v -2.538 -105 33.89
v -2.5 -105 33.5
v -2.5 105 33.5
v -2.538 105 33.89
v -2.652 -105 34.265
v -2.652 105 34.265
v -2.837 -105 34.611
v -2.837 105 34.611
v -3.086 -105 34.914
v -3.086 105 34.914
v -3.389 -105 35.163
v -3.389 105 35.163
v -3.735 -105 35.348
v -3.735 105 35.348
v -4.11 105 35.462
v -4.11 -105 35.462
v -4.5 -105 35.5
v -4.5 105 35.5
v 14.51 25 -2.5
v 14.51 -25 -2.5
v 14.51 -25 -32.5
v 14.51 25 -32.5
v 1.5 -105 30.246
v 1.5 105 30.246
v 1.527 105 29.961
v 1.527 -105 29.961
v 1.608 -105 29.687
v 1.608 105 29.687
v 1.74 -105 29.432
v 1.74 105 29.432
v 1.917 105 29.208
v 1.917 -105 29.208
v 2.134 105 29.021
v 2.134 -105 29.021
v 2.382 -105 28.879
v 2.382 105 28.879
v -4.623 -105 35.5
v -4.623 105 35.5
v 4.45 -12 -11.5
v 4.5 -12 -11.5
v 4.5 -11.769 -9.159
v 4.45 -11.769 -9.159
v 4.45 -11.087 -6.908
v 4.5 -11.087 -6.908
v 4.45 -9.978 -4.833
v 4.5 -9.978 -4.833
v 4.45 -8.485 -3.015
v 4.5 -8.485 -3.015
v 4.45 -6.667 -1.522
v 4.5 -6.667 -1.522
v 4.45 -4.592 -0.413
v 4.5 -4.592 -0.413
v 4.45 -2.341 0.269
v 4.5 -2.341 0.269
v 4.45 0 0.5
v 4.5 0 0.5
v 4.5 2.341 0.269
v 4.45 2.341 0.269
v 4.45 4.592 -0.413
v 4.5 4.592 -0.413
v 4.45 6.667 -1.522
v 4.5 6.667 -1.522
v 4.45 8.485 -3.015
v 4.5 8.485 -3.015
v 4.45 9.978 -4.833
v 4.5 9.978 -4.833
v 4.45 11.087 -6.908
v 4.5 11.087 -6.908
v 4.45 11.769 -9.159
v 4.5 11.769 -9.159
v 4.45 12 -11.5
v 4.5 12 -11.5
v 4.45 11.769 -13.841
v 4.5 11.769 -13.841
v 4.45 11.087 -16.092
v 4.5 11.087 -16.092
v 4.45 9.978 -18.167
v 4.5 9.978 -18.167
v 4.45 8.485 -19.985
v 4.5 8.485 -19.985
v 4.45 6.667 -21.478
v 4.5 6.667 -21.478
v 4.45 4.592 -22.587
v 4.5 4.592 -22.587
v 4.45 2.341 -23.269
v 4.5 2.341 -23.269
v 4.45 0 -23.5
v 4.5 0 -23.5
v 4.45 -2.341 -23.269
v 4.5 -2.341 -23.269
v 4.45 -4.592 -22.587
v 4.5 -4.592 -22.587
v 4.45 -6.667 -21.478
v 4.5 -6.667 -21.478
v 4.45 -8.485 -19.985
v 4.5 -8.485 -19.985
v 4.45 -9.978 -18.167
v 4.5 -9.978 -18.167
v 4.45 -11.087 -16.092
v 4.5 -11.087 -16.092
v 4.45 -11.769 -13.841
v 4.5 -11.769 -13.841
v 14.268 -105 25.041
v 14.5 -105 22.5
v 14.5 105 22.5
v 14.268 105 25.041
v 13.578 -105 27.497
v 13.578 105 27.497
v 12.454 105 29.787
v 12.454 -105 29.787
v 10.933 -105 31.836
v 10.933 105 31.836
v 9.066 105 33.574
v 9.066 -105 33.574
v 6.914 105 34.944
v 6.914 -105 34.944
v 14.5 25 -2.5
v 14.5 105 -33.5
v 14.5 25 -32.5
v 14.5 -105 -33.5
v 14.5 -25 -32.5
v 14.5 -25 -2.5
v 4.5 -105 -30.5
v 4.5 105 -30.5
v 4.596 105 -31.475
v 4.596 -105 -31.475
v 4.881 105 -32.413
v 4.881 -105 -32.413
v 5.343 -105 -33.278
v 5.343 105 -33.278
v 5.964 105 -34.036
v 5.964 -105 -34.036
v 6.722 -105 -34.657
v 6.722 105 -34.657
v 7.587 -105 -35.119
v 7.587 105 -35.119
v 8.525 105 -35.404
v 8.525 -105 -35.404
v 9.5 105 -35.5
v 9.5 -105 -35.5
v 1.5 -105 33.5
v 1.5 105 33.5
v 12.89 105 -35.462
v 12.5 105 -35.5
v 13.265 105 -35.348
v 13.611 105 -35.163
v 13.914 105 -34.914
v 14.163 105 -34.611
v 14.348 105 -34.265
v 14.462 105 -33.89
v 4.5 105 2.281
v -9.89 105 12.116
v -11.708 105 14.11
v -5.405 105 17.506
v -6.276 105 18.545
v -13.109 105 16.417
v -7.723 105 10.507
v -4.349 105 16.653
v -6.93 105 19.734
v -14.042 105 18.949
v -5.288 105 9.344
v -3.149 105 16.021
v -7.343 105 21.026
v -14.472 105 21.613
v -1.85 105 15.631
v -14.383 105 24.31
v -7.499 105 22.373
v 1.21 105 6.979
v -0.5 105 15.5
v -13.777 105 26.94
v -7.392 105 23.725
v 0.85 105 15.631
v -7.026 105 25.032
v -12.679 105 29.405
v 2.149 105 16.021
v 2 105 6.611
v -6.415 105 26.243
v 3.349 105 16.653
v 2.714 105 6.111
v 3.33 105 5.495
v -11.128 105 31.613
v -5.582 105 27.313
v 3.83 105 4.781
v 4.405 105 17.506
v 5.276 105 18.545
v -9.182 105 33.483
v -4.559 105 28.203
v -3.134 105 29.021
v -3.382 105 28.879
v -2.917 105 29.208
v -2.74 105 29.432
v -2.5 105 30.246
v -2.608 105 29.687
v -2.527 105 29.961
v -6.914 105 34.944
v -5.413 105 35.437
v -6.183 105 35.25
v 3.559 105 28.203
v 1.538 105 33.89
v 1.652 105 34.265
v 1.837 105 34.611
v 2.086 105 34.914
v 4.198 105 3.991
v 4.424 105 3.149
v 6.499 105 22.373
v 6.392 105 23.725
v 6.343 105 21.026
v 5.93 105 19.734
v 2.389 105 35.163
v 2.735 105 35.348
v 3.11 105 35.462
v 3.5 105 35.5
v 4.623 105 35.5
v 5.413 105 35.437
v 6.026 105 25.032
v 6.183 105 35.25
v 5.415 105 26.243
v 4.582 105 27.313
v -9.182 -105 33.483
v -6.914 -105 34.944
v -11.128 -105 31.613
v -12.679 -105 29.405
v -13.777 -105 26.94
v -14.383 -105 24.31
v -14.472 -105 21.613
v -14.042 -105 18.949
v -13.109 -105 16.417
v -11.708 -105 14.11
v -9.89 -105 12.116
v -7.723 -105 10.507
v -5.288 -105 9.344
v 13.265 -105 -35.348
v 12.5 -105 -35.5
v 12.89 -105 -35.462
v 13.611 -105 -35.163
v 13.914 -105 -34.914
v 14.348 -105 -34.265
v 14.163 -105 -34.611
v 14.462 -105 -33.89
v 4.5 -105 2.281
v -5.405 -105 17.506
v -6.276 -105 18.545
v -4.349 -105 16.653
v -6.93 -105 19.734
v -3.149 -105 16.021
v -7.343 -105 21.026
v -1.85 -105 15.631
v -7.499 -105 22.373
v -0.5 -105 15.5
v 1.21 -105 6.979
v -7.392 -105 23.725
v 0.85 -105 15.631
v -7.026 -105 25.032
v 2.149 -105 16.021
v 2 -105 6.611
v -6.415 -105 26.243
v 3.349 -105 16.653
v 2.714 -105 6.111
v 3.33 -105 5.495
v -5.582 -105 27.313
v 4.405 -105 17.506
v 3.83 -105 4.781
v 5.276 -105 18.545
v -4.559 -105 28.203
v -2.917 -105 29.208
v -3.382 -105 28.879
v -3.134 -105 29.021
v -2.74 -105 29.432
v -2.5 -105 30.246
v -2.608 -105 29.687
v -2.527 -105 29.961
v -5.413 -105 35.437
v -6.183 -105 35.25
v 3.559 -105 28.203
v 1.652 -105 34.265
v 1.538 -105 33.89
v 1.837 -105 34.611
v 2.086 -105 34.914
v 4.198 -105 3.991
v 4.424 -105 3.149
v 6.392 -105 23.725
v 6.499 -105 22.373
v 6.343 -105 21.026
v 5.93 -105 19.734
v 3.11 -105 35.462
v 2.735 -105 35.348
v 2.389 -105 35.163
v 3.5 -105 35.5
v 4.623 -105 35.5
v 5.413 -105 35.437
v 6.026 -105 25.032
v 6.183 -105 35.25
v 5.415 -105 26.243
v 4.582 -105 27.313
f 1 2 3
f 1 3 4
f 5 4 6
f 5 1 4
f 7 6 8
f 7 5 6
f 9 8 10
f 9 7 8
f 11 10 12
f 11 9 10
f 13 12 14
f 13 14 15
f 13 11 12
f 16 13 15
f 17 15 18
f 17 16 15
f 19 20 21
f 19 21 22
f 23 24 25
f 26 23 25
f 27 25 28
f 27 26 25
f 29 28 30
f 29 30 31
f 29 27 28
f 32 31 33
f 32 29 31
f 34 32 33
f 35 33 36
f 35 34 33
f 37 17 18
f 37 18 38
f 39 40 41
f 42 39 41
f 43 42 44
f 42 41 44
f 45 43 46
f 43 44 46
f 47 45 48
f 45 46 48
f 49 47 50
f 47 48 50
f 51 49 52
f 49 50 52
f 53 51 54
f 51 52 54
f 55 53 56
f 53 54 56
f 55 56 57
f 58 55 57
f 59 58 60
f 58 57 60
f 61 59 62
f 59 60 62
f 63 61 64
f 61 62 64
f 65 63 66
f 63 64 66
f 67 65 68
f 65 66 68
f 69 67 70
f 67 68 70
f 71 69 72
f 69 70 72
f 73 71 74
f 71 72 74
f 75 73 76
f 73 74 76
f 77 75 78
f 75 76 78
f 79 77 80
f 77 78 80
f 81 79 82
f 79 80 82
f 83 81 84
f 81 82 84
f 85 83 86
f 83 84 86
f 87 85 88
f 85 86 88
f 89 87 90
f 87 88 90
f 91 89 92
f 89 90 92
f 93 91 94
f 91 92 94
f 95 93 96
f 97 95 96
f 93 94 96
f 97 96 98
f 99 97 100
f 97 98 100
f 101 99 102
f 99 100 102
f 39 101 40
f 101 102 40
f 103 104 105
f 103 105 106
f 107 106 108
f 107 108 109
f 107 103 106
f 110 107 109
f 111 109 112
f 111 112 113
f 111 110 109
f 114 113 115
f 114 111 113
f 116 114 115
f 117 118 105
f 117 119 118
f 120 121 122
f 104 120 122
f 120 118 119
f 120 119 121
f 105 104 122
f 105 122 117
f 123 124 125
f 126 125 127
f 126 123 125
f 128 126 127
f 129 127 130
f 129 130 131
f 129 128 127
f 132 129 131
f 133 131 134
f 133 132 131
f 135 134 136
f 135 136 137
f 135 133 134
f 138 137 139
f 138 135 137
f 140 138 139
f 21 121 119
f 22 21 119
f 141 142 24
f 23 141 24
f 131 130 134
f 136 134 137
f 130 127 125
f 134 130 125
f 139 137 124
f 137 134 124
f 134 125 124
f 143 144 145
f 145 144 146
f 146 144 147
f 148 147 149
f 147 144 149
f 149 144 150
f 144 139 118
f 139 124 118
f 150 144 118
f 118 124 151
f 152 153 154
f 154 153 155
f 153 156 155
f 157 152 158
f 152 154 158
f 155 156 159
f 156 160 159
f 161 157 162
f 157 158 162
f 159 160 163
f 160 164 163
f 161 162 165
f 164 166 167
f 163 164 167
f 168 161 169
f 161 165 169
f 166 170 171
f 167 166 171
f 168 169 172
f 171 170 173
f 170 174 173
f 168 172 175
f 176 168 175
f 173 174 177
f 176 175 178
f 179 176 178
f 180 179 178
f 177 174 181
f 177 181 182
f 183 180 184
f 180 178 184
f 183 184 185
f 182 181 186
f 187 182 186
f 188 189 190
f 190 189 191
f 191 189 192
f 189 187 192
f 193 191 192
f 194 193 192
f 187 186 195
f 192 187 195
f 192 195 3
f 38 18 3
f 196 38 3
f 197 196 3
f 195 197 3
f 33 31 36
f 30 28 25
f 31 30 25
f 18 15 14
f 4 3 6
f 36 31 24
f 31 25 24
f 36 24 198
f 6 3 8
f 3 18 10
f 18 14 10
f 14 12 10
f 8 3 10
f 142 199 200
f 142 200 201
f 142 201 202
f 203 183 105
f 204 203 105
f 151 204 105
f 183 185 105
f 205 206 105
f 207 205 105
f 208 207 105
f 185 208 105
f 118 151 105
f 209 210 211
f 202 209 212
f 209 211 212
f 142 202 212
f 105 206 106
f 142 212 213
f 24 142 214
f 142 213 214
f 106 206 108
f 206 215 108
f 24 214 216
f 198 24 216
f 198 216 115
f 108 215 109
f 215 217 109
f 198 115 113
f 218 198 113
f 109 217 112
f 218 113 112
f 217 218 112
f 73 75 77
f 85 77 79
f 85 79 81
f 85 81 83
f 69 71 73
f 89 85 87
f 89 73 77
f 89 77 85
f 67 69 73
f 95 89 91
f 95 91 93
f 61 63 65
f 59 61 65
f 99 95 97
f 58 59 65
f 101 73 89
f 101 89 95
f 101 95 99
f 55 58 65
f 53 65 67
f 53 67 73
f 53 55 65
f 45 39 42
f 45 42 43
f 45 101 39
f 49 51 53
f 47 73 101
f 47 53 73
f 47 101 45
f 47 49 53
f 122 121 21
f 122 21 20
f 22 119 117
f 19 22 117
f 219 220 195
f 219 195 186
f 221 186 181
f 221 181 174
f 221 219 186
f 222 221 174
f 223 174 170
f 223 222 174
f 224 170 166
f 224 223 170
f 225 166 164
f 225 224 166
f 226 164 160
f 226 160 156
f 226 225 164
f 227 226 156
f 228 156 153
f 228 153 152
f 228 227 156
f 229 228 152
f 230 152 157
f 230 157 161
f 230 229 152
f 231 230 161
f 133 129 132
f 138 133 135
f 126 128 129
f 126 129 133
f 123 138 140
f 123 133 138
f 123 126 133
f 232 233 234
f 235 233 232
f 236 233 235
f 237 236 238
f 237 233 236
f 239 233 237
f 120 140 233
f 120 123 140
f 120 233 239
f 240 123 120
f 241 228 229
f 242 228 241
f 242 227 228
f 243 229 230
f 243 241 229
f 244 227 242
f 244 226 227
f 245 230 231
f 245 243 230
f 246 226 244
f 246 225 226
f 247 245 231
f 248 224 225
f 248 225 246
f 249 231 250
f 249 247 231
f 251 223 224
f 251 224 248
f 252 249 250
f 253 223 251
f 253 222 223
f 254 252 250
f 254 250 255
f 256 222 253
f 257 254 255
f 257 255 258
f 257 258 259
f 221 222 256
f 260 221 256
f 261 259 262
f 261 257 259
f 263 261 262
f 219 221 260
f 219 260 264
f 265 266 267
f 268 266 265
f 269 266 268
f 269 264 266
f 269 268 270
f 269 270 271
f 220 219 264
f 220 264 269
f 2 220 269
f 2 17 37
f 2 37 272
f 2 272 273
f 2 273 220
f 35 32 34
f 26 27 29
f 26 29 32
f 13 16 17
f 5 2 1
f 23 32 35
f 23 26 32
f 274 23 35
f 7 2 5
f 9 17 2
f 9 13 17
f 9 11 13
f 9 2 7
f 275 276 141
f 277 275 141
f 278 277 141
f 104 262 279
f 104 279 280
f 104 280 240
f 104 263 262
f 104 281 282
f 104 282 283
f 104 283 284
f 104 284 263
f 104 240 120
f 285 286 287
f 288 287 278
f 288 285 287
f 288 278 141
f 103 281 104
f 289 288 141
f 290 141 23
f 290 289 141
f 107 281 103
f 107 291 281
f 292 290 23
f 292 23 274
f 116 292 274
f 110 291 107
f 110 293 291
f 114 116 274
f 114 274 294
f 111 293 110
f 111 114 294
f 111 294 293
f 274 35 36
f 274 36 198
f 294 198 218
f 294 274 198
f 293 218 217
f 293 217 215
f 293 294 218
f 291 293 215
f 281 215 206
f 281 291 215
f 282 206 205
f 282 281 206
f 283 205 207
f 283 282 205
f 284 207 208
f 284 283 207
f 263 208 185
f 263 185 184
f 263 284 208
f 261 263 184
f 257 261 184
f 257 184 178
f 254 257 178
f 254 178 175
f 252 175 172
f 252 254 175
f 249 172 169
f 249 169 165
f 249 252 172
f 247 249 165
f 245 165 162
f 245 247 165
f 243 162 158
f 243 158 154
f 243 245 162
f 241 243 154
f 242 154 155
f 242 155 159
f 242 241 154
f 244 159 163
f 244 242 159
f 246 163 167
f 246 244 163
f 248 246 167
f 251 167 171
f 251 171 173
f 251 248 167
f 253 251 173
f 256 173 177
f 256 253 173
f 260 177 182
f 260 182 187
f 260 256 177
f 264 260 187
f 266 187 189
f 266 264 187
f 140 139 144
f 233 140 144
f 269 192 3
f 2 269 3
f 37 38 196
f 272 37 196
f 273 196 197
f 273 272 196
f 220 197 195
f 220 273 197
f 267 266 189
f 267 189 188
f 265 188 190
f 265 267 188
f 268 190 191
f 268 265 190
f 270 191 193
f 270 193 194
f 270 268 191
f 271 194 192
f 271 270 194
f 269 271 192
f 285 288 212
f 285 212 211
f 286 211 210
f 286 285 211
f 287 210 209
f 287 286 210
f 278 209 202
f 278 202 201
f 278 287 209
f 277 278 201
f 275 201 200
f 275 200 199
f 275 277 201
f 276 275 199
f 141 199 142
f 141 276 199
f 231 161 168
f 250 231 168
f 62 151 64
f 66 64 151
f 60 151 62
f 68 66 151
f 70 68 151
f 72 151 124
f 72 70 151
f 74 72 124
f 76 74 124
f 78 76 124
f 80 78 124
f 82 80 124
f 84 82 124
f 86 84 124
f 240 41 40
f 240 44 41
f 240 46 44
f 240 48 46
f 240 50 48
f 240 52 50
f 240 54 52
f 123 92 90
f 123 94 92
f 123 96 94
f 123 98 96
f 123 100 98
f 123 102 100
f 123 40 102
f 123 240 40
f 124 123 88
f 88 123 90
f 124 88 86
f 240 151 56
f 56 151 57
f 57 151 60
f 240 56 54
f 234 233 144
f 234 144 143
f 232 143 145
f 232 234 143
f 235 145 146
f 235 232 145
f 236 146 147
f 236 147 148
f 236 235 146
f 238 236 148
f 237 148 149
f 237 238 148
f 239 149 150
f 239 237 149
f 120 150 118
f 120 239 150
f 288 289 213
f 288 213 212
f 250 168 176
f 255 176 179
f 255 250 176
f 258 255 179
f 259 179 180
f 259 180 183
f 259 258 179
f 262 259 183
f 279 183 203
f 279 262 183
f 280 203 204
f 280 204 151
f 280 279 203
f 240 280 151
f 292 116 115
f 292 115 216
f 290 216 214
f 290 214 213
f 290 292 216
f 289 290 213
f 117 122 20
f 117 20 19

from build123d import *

# Parameters (mm, degrees)
F1_DEPTH = 105
F2_R     = 12
F3_DEPTH = 0.05
F4_W     = 50
F4_H     = 30
F5_DEPTH = 0.01


# Not quite as in the source:
# - ends of sketch curves that miss each other by under 0.0002 mm in the source are joined


with BuildPart() as f1:
    # F0 (on Front) → F1 (new body, symmetric)
    with BuildSketch(Plane.XZ):
        with BuildLine():
            Line((4.4999999997, -23.5), (4.4999999997, -30.5))
            ThreePointArc((4.4999999997, -30.5), (5.9644660938, -34.0355339059), (9.4999999997, -35.5))
            Line((9.4999999997, -35.5), (12.5, -35.5))
            ThreePointArc((12.5, -35.5), (13.9142133287, -34.9142135624), (14.4999997663, -33.5))
            Line((14.4999997663, -33.5), (14.4999997663, 22.4999994828))
            ThreePointArc((14.4999997663, 22.4999994828), (12.4539129776, 29.7872458033), (6.9137199183, 34.9444437777))
            ThreePointArc((6.9137199183, 34.9444437777), (5.8016169865, 35.3591259101), (4.6231056877, 35.4999993303))
            Line((4.6231056877, 35.4999993303), (3.4999997663, 35.4999993303))
            ThreePointArc((3.4999997663, 35.4999993303), (2.0857862039, 34.9142128927), (1.4999997663, 33.4999993303))
            Line((1.4999997663, 33.4999993303), (1.4999997663, 30.2459664828))
            ThreePointArc((1.4999997663, 30.2459664828), (1.7397477835, 29.4324771221), (2.3823530195, 28.8790310431))
            ThreePointArc((2.3823530195, 28.8790310431), (-0.5000000985, 15.4999997293), (-3.3823532363, 28.8790310342))
            ThreePointArc((-3.3823532363, 28.8790310342), (-2.7397478169, 29.4324771961), (-2.4999997997, 30.2459665567))
            Line((-2.4999997997, 30.2459665567), (-2.4999997997, 33.5))
            ThreePointArc((-2.4999997997, 33.5), (-3.0857862373, 34.9142132361), (-4.4999997997, 35.4999996738))
            Line((-4.4999997997, 35.4999996738), (-4.6231058319, 35.4999996738))
            ThreePointArc((-4.6231058319, 35.4999996738), (-5.8016171306, 35.3591262536), (-6.9137200625, 34.9444441212))
            ThreePointArc((-6.9137200625, 34.9444441212), (-14.4718653147, 21.6128794539), (-5.288282, 9.344303))
            Line((-5.288282, 9.344303), (1.210101, 6.979085))
            ThreePointArc((1.210101, 6.979085), (3.5957603078, 5.1485040574), (4.4999999997, 2.2806219993))
            Line((4.4999999997, 2.2806219993), (4.4999999997, 0.5))
            Line((4.4999999997, 0.5), (4.4999999997, -23.5))
        make_face()
    extrude(amount=F1_DEPTH, both=True)

    # F2 (on face) → F3 (join)
    with BuildSketch(Plane(origin=(4.4999999997, 0, 0), x_dir=(0, -1, 0), z_dir=(-1, 0, 0))):
        with Locations((0, -11.5)):
            Circle(F2_R)
    extrude(amount=F3_DEPTH)

    # F4 (on face) → F5 (join)
    with BuildSketch(Plane.YZ.offset(14.4999997663)):
        with Locations((0, -17.5000005172)):
            Rectangle(F4_W, F4_H)
    extrude(amount=F5_DEPTH)


solid = f1.part
